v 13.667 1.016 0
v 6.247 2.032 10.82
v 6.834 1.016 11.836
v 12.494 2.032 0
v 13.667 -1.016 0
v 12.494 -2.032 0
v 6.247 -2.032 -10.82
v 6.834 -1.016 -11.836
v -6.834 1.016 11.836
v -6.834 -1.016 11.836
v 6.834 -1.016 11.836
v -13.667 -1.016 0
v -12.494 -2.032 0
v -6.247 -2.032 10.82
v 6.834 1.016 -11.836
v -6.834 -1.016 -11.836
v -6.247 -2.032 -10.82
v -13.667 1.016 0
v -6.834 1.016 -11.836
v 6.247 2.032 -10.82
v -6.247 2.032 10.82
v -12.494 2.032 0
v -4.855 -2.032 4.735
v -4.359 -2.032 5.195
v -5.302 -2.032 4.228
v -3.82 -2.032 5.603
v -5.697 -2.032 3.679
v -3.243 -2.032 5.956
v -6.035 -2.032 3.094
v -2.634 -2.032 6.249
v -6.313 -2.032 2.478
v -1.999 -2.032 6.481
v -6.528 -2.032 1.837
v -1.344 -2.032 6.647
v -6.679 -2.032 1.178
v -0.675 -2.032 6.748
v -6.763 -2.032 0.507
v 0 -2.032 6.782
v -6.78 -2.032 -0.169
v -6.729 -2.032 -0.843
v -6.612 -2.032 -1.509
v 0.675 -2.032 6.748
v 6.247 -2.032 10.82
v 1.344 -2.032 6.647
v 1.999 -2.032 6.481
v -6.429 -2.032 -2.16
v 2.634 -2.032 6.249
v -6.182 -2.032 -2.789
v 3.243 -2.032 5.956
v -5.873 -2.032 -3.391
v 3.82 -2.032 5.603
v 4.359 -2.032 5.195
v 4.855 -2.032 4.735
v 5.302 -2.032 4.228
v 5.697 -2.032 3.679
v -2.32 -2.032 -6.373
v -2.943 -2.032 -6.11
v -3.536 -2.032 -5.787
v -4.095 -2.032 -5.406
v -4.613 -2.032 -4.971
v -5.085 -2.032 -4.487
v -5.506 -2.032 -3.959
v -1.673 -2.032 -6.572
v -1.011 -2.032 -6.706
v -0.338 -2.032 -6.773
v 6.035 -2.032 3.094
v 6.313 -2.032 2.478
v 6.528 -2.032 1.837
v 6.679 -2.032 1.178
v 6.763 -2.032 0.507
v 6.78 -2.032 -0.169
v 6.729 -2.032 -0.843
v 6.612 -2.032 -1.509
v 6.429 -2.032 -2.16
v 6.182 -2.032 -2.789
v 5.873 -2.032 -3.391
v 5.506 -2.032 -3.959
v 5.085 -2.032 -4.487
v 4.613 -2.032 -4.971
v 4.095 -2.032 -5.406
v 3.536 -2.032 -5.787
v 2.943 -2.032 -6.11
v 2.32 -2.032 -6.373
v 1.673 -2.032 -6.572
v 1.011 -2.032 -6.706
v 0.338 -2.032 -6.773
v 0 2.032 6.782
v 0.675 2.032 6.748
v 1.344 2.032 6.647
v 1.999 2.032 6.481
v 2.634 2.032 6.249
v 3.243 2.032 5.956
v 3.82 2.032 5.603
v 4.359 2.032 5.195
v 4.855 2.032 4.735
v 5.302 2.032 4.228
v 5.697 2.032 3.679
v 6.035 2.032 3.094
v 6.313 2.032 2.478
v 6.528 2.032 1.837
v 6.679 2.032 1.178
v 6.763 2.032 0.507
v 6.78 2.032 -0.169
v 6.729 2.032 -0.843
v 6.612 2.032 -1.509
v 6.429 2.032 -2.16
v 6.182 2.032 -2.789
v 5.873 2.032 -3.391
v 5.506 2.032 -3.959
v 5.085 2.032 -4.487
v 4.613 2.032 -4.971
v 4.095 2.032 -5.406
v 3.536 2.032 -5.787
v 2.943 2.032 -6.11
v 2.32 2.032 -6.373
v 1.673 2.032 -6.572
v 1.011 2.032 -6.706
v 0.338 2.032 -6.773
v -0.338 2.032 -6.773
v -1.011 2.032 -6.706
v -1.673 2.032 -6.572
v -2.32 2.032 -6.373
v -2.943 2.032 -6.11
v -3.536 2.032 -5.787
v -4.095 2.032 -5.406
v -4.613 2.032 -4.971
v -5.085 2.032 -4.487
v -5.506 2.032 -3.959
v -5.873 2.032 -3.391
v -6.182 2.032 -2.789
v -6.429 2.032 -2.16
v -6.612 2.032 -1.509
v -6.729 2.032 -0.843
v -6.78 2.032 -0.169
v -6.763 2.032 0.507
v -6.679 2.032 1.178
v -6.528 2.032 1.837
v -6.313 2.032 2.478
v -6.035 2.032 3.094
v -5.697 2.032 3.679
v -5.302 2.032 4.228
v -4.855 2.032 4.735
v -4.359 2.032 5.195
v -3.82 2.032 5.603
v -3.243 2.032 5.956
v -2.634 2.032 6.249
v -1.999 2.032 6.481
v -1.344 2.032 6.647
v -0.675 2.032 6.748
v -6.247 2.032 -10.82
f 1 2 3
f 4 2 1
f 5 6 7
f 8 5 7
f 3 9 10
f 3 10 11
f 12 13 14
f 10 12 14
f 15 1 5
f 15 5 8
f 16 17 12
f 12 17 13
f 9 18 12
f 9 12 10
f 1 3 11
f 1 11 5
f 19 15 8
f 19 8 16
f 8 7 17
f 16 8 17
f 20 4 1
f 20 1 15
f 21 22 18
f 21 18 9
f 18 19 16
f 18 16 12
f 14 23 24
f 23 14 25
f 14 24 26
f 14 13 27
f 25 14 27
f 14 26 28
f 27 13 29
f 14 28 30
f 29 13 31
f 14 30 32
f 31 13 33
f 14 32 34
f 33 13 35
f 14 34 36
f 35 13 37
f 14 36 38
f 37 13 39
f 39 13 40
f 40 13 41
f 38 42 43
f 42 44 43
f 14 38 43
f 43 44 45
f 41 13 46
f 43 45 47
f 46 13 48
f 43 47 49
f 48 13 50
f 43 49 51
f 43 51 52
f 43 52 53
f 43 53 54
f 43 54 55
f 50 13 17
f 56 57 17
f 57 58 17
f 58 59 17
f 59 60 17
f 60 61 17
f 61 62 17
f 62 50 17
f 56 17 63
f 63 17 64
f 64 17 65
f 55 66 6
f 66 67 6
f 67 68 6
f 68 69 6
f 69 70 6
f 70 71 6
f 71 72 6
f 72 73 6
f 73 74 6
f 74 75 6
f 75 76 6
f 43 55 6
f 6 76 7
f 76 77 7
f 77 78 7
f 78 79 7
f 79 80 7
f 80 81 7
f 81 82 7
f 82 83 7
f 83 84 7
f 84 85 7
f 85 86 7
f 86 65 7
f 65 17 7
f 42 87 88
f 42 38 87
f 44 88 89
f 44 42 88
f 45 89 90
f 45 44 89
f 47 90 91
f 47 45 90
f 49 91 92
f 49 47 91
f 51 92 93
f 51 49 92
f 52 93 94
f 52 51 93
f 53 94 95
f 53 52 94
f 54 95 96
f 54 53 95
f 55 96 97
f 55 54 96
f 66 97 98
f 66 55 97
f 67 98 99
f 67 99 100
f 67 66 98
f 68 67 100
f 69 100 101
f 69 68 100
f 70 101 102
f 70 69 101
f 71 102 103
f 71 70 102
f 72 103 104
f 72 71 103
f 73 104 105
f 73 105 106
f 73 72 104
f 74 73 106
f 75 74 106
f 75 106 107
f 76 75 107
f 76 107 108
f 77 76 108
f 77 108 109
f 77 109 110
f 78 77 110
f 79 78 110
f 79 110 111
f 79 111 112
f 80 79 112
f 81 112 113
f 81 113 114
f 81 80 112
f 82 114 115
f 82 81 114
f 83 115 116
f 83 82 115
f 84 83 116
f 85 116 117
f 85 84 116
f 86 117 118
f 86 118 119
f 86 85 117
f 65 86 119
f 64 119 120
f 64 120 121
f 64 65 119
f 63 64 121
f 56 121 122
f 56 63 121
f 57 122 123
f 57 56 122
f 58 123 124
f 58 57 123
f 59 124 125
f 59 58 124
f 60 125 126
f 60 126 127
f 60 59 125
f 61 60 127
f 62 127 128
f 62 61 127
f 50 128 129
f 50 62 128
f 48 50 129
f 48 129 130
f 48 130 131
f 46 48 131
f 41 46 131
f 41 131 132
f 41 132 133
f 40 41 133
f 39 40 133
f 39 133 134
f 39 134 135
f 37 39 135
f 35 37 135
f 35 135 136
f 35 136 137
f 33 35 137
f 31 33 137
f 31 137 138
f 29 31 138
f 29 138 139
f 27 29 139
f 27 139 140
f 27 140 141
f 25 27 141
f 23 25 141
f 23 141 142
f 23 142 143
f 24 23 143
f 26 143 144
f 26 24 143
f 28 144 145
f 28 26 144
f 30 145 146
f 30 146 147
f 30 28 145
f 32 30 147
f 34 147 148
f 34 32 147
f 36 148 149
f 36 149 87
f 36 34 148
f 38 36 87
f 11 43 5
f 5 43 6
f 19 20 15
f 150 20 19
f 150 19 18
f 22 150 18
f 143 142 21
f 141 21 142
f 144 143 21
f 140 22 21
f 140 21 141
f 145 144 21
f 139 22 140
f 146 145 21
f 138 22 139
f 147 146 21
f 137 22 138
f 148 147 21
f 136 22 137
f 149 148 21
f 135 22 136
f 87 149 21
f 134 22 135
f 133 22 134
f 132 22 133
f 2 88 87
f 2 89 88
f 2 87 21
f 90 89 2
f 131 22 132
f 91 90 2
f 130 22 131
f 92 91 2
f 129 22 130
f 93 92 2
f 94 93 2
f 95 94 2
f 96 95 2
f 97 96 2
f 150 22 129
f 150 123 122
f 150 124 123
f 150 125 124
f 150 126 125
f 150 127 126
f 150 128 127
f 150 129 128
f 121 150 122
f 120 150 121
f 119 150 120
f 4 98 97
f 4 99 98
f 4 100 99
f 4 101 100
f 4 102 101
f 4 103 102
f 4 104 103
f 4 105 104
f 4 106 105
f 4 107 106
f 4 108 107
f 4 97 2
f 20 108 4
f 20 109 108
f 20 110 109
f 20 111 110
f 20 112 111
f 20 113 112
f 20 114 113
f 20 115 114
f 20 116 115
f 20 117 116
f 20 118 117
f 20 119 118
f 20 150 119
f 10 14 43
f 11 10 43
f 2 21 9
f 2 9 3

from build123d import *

# Parameters (mm, degrees)
SKETCH1_R           = 6.7818
BOSS_EXTRUDE1_DEPTH = 2.032
CHAMFER1_SIZE       = 1.016


with BuildPart() as part:
    # Sketch1 → Boss-Extrude1 (new, symmetric)
    with BuildSketch(Plane(origin=(0, 0, 0), x_dir=(1, 0, 0), z_dir=(0, 1, 0))):
        Polygon((6.833748726, 11.8364), (-6.833748726, 11.8364), (-13.667497452, 0), (-6.833748726, -11.8364), (6.833748726, -11.8364), (13.667497452, 0), align=None)
        with Locations(Location((0, 0, 0), (0, 0, 270))):
            Circle(SKETCH1_R, mode=Mode.SUBTRACT)
    extrude(amount=BOSS_EXTRUDE1_DEPTH, both=True)

    # Chamfer1
    chamfer1_edges = [part.edges().sort_by_distance(p)[0] for p in [
        (-10.250623089, 2.032, -5.9182),
        (-10.250623089, 2.032, 5.9182),
        (0, 2.032, 11.8364),
        (10.250623089, 2.032, 5.9182),
        (10.250623089, 2.032, -5.9182),
        (10.250623089, -2.032, 5.9182),
        (0, -2.032, 11.8364),
        (-10.250623089, -2.032, 5.9182),
        (-10.250623089, -2.032, -5.9182),
        (0, -2.032, -11.8364),
        (10.250623089, -2.032, -5.9182),
        (0, 2.032, -11.8364),
    ]]
    chamfer(chamfer1_edges, length=CHAMFER1_SIZE)


solid = part.part
